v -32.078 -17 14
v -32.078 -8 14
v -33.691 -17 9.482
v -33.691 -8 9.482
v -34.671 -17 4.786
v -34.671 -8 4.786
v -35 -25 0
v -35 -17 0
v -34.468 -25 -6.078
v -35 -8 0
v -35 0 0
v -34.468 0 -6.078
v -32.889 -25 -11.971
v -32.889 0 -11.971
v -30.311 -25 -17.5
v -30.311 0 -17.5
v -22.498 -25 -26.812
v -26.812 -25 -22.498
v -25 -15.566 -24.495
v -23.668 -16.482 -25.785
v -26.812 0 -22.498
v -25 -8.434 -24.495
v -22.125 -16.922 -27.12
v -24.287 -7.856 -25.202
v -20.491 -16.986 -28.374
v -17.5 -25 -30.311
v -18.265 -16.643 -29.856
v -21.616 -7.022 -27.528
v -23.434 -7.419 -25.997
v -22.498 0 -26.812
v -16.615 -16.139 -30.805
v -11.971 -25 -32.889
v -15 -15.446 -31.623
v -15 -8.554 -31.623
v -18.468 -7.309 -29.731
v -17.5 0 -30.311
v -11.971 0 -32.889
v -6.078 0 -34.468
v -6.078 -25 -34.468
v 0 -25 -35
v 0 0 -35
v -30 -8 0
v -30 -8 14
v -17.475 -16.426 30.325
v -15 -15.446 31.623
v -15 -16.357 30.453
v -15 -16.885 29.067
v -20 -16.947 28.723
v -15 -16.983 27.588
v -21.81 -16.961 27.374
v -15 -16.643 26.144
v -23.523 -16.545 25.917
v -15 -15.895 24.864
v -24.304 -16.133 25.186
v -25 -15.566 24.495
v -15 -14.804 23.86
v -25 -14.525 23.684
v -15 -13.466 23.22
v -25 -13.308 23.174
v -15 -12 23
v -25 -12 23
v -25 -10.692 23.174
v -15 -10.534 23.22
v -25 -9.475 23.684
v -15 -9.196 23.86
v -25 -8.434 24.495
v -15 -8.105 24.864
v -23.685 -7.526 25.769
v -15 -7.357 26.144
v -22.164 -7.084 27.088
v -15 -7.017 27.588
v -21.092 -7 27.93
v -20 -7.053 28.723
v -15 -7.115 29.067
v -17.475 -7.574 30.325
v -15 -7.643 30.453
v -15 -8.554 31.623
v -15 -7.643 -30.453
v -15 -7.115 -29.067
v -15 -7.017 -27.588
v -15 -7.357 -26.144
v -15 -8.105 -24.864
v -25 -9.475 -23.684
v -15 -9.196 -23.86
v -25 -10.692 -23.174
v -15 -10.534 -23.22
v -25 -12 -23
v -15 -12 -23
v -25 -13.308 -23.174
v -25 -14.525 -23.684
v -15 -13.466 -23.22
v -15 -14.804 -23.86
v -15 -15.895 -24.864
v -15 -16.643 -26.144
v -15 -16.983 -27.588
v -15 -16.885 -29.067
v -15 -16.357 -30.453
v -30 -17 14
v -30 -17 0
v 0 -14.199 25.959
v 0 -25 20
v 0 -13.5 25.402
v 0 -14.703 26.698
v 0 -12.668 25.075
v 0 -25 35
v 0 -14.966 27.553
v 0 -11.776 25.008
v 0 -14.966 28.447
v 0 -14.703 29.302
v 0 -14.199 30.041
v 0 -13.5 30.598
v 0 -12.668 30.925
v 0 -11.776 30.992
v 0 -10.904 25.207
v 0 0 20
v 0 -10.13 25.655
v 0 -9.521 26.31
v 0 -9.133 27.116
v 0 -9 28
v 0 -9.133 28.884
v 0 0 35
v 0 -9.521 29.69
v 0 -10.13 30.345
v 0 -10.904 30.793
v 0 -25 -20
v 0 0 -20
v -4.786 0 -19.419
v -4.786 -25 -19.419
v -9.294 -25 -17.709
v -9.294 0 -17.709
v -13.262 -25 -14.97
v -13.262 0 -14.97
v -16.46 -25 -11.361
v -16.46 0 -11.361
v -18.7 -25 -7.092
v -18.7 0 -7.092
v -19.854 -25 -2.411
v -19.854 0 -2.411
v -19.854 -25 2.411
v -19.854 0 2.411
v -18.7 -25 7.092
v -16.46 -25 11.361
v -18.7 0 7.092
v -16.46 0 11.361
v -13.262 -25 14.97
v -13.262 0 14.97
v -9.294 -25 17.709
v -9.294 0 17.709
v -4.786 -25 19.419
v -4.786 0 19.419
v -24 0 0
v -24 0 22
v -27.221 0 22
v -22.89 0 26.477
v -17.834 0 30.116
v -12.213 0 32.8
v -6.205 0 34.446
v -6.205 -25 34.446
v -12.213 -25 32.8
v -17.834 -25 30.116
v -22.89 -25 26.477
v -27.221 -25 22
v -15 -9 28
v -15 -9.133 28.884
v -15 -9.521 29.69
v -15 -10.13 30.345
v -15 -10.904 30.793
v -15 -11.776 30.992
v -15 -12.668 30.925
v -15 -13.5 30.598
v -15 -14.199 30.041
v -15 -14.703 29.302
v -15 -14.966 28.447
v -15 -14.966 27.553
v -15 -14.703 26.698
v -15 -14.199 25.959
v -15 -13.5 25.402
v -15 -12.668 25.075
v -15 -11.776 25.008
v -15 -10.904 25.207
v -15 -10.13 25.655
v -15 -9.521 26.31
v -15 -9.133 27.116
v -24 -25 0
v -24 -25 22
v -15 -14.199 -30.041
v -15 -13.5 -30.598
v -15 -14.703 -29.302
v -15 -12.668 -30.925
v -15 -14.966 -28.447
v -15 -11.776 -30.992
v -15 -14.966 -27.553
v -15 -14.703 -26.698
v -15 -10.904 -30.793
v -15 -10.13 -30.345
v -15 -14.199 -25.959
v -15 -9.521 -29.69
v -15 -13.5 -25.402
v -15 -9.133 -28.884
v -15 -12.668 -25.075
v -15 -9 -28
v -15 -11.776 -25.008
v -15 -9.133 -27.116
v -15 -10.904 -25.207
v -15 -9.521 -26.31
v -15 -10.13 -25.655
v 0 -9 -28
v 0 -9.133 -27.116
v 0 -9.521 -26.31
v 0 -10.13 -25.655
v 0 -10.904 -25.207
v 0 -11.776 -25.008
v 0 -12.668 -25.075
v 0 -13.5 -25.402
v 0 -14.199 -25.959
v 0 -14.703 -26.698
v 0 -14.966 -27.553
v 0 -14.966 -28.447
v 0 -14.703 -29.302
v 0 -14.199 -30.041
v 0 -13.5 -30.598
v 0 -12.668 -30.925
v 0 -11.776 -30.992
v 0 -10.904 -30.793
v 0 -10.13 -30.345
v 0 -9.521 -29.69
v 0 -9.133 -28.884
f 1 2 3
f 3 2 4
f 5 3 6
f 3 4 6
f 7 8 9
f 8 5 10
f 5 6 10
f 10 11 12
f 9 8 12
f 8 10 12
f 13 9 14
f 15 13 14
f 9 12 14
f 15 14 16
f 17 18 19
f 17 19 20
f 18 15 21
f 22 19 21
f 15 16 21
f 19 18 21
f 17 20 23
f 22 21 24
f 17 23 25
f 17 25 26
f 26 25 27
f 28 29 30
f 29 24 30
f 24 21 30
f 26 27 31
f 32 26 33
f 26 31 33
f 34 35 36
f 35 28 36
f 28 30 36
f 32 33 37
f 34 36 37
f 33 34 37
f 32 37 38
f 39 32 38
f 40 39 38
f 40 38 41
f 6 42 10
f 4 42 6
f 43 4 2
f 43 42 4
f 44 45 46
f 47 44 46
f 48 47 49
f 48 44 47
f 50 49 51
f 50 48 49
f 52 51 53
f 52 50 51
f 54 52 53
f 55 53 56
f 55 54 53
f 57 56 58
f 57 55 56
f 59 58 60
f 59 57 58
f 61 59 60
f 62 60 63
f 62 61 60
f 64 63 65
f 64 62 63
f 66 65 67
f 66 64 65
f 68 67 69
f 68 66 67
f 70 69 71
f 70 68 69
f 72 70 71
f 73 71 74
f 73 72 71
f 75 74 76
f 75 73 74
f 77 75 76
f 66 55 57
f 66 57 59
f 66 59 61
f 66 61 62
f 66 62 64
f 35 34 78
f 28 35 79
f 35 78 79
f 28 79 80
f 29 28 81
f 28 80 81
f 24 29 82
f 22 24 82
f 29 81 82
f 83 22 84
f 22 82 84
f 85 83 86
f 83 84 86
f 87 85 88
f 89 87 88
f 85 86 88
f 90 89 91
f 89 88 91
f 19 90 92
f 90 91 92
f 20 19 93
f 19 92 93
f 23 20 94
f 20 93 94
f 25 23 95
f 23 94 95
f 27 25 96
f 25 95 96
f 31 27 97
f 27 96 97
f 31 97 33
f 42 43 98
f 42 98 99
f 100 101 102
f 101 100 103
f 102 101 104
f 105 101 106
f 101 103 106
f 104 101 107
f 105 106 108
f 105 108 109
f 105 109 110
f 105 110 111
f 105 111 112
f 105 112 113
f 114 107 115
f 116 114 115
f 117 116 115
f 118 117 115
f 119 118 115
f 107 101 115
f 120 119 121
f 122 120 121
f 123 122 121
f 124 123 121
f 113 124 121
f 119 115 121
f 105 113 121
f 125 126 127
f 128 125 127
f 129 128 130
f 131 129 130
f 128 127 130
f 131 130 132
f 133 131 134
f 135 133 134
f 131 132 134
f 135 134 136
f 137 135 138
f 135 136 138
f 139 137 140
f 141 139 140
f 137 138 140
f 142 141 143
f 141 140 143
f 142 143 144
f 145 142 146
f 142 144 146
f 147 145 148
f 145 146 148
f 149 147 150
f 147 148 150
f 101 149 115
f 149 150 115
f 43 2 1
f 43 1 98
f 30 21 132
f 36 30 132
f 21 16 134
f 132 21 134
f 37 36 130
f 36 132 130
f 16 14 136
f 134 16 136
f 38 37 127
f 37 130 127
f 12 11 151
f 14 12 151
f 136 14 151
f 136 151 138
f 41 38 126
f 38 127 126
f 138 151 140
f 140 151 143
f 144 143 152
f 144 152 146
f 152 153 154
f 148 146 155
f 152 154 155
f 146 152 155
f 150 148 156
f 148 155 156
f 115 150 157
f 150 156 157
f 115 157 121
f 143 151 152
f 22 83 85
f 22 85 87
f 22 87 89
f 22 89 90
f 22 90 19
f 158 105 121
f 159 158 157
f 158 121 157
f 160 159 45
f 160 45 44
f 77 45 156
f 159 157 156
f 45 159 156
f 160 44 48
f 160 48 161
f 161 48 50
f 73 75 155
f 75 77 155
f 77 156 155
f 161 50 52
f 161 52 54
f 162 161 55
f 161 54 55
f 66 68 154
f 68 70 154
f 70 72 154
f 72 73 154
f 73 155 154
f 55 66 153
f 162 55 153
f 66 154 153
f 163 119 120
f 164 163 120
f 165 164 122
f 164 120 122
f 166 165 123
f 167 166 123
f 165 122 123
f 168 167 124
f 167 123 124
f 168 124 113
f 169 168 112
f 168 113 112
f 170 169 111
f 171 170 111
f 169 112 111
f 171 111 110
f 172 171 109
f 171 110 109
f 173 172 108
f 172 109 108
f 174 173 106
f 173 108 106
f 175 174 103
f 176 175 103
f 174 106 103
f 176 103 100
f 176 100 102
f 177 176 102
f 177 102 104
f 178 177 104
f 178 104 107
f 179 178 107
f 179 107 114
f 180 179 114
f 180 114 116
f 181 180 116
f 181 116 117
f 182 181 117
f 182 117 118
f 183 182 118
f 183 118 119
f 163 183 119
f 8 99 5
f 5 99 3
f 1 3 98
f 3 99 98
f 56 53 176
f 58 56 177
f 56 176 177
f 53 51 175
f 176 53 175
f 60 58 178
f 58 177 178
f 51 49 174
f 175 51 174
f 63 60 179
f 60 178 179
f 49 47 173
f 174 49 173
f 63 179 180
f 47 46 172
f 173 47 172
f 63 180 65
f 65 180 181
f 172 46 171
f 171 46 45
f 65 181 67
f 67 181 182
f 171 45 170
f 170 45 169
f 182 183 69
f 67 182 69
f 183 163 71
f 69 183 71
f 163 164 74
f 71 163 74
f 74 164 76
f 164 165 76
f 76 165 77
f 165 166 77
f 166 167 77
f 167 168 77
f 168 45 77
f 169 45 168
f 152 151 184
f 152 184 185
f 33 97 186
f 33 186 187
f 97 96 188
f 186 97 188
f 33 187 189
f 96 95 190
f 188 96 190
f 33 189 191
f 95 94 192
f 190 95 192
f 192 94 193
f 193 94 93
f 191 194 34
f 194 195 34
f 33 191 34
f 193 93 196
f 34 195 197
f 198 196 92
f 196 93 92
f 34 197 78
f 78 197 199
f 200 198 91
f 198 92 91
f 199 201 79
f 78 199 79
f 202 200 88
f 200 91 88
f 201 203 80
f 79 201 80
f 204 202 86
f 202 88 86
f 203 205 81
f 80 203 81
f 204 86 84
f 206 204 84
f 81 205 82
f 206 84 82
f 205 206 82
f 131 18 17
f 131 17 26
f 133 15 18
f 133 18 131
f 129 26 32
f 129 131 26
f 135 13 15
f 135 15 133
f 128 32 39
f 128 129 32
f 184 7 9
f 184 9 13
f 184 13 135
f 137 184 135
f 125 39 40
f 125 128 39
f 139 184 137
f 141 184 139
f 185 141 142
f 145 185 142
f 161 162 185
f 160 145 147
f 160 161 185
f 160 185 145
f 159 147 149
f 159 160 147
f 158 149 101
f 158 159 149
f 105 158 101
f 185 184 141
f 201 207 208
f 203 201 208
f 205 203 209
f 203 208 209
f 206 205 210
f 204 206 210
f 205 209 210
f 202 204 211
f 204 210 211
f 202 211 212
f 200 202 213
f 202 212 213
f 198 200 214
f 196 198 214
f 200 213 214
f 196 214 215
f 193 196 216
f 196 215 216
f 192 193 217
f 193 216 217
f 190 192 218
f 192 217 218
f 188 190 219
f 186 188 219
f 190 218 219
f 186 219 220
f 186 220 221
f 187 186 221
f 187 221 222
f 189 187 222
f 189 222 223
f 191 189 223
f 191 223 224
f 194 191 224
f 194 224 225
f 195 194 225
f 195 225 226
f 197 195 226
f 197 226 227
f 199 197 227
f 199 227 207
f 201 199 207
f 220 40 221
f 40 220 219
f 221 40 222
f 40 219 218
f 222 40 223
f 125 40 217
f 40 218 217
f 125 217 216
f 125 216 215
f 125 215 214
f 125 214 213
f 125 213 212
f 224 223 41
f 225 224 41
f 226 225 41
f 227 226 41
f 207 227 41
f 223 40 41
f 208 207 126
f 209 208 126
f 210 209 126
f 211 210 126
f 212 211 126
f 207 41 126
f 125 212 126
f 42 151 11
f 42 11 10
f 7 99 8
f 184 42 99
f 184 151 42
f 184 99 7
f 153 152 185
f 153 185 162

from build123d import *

# Parameters (mm, degrees)
F1_DEPTH  = 25
F2_R      = 3
F3_DEPTH  = 25
F5_R      = 5
F6_DEPTH  = 5
F8_DEPTH  = 28.5
F9_W      = 8
F9_H      = 14
F10_DEPTH = 25


with BuildPart() as f1:
    # F0 (on Front) → F1 (new body)
    with BuildSketch(Plane.XZ):
        with BuildLine():
            Line((0, 20), (0, 35))
            ThreePointArc((0, 35), (-35, 0), (0, -35))
            Line((0, -35), (0, -20))
            ThreePointArc((0, -20), (-20, 0), (0, 20))
        make_face()
    extrude(amount=F1_DEPTH)

    # F2 (on Right) → F3 (cut)
    with BuildSketch(Plane.YZ):
        with Locations((-12, 28)):
            Circle(F2_R)
        with Locations((-12, -28)):
            Circle(F2_R)
    extrude(amount=-F3_DEPTH, mode=Mode.SUBTRACT)

    # F5 (on offset) → F6 (cut, symmetric)
    with BuildSketch(Plane.YZ.offset(-20)):
        with Locations((-12, 28)):
            Circle(F5_R)
        with Locations((-12, -28)):
            Circle(F5_R)
    extrude(amount=F6_DEPTH, both=True, mode=Mode.SUBTRACT)

    # F7 (on Front) → F8 (cut)
    with BuildSketch(Plane.XZ):
        Polygon((-30, 0), (-24, 0), (-24, 14), (-24, 22), (-30, 22), (-44, 22), (-44, 14), (-30, 14), align=None)
    extrude(amount=F8_DEPTH, mode=Mode.SUBTRACT)

    # F9 (on face) → F10 (cut)
    with BuildSketch(Plane(origin=(-24, 0, 0), x_dir=(0, -1, 0), z_dir=(-1, 0, 0))):
        with Locations((4, 7)):
            Rectangle(F9_W, F9_H)
        with Locations((21, 7)):
            Rectangle(F9_W, F9_H)
    extrude(amount=F10_DEPTH, mode=Mode.SUBTRACT)


solid = f1.part
